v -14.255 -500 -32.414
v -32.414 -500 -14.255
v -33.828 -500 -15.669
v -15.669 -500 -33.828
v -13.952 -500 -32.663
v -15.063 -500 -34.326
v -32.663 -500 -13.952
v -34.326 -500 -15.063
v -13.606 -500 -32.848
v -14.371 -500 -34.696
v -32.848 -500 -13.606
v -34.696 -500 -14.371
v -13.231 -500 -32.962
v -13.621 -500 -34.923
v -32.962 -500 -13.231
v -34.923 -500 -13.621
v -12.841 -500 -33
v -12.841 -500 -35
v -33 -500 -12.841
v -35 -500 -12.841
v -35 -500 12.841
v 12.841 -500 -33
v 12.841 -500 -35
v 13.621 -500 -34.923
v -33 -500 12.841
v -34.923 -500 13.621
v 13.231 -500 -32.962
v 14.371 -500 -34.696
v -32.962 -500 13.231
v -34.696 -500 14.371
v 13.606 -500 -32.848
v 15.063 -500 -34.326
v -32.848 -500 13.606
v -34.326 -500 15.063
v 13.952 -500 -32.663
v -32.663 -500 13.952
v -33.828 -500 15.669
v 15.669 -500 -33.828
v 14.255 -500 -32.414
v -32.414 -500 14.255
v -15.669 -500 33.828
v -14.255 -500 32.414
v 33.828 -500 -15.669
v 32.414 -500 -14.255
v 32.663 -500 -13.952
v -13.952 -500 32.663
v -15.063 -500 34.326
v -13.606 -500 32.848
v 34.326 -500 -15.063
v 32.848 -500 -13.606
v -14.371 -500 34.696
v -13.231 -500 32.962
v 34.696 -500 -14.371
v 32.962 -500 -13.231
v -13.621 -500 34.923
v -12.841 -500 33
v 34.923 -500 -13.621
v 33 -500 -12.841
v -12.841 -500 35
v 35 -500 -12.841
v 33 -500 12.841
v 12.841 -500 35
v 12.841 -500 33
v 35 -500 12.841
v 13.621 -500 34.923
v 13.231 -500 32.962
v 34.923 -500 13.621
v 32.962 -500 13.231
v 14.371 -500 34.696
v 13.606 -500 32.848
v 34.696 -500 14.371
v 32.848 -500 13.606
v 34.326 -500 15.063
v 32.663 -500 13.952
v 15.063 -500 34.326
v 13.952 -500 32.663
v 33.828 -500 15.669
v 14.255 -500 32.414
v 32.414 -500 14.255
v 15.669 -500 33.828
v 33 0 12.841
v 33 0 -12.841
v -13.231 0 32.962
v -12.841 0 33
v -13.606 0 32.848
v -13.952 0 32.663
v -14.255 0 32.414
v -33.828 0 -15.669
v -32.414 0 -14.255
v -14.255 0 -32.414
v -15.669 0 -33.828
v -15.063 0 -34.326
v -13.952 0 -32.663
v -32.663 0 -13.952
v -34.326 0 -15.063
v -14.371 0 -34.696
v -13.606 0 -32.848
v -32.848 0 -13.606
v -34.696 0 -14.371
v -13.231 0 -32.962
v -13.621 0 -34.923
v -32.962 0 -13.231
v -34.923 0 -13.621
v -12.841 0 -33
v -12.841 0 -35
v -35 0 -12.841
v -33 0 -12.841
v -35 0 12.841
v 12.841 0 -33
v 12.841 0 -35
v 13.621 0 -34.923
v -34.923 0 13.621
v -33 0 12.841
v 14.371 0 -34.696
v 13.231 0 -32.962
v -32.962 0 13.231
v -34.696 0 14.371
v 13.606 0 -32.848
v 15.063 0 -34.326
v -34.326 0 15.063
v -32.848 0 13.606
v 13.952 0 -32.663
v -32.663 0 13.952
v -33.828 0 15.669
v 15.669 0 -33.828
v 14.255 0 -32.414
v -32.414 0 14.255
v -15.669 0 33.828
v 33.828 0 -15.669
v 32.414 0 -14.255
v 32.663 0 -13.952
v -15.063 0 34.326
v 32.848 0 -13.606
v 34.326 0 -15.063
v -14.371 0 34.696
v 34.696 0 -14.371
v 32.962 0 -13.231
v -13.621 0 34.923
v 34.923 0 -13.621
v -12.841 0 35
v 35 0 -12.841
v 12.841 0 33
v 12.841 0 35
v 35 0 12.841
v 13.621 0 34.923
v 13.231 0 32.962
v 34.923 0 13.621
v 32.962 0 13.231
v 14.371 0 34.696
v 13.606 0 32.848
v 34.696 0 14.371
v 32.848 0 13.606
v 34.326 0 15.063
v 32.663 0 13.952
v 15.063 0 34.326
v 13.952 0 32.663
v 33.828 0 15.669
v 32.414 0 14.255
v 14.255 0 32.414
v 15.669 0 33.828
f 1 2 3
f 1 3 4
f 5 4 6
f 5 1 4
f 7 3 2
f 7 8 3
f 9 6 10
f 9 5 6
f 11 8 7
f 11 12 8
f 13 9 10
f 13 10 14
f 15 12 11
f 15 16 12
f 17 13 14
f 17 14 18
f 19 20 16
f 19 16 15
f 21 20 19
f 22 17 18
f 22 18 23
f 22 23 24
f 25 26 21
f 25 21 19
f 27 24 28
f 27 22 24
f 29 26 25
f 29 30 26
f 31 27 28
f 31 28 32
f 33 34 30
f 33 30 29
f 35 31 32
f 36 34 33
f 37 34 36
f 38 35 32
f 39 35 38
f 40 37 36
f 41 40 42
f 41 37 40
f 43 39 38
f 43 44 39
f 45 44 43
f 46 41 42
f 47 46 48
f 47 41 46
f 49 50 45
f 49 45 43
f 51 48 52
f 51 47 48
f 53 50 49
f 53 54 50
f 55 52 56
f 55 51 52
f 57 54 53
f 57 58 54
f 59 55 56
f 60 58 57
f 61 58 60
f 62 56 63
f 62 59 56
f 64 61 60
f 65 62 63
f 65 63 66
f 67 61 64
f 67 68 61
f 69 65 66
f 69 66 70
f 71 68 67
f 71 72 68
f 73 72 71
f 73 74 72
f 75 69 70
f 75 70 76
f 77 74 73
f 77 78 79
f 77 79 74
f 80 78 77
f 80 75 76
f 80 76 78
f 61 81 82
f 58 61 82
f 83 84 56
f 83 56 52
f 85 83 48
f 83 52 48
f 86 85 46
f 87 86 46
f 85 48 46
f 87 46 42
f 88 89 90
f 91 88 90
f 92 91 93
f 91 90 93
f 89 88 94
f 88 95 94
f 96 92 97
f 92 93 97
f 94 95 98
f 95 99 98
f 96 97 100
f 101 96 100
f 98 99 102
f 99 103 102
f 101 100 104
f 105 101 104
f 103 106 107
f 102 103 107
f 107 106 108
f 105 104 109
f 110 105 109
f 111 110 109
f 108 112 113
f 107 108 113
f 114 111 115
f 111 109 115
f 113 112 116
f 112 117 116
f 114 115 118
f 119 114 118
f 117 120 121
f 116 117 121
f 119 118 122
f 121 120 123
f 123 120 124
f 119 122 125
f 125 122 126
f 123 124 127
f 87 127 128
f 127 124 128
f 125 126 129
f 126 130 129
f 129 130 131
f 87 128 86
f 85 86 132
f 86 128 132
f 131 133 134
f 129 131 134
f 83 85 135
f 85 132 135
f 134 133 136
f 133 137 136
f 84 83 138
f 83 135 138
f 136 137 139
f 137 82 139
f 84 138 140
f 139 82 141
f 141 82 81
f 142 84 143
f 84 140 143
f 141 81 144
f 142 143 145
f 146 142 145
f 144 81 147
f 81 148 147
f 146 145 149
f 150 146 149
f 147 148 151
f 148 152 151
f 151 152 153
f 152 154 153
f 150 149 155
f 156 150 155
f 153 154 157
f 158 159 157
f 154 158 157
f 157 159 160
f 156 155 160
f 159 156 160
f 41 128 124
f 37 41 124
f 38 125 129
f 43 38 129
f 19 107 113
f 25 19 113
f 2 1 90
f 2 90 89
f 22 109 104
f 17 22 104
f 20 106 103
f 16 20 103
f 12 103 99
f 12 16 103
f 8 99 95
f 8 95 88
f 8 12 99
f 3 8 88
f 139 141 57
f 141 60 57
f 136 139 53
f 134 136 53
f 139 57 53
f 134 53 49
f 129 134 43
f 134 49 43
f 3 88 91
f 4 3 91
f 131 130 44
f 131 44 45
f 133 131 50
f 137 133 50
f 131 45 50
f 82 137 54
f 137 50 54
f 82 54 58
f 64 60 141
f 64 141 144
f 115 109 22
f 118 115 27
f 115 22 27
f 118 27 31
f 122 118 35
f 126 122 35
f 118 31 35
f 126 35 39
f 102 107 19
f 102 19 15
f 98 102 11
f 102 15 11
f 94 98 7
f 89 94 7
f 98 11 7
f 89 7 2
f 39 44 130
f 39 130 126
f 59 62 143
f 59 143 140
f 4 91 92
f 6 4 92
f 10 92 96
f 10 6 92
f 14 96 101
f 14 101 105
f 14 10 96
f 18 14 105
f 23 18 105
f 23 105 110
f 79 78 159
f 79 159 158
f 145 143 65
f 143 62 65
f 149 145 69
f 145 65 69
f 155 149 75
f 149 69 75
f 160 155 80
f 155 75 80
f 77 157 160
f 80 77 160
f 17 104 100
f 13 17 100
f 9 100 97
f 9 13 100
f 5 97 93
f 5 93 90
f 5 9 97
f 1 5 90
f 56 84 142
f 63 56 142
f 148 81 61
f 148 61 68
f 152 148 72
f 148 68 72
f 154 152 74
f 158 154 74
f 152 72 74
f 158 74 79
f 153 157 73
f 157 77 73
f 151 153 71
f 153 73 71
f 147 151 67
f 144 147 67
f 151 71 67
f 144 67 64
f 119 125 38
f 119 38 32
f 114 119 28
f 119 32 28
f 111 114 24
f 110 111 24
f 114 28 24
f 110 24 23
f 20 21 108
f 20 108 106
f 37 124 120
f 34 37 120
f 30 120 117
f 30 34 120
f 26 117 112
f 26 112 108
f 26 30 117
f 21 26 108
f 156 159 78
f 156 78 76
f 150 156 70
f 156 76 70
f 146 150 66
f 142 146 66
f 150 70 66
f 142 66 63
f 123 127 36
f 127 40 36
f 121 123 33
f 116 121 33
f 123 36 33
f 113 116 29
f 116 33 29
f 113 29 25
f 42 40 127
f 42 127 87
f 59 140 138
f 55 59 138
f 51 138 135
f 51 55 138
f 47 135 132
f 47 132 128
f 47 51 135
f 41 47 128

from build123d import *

# Parameters (mm, degrees)
F1_DEPTH = 500
F2_R     = 4
F3_R     = 2


with BuildPart() as f1:
    # F0 (on Front) → F1 (new body)
    with BuildSketch(Plane.XZ):
        Polygon((14.497475, 35), (-14.497475, 35), (-35, 14.497475), (-35, -14.497475), (-14.497475, -35), (14.497475, -35), (35, -14.497475), (35, 14.497475), align=None)
        Polygon((-13.669048, -33), (-33, -13.669048), (-33, 13.669048), (-13.669048, 33), (13.669048, 33), (33, 13.669048), (33, -13.669048), (13.669048, -33), align=None, mode=Mode.SUBTRACT)
    extrude(amount=F1_DEPTH)

    # F2
    f2_edges = [f1.edges().sort_by_distance(p)[0] for p in [
        (14.497475, -250, 35),
        (-14.497475, -250, 35),
        (35, -250, 14.497475),
        (35, -250, -14.497475),
        (14.497475, -250, -35),
        (-14.497475, -250, -35),
        (-35, -250, -14.497475),
        (-35, -250, 14.497475),
    ]]
    fillet(f2_edges, radius=F2_R)

    # F3
    f3_edges = [f1.edges().sort_by_distance(p)[0] for p in [
        (33, -250, 13.669048),
        (33, -250, -13.669048),
        (13.669048, -250, -33),
        (-13.669048, -250, -33),
        (-33, -250, -13.669048),
        (-33, -250, 13.669048),
        (-13.669048, -250, 33),
        (13.669048, -250, 33),
    ]]
    fillet(f3_edges, radius=F3_R)


solid = f1.part
